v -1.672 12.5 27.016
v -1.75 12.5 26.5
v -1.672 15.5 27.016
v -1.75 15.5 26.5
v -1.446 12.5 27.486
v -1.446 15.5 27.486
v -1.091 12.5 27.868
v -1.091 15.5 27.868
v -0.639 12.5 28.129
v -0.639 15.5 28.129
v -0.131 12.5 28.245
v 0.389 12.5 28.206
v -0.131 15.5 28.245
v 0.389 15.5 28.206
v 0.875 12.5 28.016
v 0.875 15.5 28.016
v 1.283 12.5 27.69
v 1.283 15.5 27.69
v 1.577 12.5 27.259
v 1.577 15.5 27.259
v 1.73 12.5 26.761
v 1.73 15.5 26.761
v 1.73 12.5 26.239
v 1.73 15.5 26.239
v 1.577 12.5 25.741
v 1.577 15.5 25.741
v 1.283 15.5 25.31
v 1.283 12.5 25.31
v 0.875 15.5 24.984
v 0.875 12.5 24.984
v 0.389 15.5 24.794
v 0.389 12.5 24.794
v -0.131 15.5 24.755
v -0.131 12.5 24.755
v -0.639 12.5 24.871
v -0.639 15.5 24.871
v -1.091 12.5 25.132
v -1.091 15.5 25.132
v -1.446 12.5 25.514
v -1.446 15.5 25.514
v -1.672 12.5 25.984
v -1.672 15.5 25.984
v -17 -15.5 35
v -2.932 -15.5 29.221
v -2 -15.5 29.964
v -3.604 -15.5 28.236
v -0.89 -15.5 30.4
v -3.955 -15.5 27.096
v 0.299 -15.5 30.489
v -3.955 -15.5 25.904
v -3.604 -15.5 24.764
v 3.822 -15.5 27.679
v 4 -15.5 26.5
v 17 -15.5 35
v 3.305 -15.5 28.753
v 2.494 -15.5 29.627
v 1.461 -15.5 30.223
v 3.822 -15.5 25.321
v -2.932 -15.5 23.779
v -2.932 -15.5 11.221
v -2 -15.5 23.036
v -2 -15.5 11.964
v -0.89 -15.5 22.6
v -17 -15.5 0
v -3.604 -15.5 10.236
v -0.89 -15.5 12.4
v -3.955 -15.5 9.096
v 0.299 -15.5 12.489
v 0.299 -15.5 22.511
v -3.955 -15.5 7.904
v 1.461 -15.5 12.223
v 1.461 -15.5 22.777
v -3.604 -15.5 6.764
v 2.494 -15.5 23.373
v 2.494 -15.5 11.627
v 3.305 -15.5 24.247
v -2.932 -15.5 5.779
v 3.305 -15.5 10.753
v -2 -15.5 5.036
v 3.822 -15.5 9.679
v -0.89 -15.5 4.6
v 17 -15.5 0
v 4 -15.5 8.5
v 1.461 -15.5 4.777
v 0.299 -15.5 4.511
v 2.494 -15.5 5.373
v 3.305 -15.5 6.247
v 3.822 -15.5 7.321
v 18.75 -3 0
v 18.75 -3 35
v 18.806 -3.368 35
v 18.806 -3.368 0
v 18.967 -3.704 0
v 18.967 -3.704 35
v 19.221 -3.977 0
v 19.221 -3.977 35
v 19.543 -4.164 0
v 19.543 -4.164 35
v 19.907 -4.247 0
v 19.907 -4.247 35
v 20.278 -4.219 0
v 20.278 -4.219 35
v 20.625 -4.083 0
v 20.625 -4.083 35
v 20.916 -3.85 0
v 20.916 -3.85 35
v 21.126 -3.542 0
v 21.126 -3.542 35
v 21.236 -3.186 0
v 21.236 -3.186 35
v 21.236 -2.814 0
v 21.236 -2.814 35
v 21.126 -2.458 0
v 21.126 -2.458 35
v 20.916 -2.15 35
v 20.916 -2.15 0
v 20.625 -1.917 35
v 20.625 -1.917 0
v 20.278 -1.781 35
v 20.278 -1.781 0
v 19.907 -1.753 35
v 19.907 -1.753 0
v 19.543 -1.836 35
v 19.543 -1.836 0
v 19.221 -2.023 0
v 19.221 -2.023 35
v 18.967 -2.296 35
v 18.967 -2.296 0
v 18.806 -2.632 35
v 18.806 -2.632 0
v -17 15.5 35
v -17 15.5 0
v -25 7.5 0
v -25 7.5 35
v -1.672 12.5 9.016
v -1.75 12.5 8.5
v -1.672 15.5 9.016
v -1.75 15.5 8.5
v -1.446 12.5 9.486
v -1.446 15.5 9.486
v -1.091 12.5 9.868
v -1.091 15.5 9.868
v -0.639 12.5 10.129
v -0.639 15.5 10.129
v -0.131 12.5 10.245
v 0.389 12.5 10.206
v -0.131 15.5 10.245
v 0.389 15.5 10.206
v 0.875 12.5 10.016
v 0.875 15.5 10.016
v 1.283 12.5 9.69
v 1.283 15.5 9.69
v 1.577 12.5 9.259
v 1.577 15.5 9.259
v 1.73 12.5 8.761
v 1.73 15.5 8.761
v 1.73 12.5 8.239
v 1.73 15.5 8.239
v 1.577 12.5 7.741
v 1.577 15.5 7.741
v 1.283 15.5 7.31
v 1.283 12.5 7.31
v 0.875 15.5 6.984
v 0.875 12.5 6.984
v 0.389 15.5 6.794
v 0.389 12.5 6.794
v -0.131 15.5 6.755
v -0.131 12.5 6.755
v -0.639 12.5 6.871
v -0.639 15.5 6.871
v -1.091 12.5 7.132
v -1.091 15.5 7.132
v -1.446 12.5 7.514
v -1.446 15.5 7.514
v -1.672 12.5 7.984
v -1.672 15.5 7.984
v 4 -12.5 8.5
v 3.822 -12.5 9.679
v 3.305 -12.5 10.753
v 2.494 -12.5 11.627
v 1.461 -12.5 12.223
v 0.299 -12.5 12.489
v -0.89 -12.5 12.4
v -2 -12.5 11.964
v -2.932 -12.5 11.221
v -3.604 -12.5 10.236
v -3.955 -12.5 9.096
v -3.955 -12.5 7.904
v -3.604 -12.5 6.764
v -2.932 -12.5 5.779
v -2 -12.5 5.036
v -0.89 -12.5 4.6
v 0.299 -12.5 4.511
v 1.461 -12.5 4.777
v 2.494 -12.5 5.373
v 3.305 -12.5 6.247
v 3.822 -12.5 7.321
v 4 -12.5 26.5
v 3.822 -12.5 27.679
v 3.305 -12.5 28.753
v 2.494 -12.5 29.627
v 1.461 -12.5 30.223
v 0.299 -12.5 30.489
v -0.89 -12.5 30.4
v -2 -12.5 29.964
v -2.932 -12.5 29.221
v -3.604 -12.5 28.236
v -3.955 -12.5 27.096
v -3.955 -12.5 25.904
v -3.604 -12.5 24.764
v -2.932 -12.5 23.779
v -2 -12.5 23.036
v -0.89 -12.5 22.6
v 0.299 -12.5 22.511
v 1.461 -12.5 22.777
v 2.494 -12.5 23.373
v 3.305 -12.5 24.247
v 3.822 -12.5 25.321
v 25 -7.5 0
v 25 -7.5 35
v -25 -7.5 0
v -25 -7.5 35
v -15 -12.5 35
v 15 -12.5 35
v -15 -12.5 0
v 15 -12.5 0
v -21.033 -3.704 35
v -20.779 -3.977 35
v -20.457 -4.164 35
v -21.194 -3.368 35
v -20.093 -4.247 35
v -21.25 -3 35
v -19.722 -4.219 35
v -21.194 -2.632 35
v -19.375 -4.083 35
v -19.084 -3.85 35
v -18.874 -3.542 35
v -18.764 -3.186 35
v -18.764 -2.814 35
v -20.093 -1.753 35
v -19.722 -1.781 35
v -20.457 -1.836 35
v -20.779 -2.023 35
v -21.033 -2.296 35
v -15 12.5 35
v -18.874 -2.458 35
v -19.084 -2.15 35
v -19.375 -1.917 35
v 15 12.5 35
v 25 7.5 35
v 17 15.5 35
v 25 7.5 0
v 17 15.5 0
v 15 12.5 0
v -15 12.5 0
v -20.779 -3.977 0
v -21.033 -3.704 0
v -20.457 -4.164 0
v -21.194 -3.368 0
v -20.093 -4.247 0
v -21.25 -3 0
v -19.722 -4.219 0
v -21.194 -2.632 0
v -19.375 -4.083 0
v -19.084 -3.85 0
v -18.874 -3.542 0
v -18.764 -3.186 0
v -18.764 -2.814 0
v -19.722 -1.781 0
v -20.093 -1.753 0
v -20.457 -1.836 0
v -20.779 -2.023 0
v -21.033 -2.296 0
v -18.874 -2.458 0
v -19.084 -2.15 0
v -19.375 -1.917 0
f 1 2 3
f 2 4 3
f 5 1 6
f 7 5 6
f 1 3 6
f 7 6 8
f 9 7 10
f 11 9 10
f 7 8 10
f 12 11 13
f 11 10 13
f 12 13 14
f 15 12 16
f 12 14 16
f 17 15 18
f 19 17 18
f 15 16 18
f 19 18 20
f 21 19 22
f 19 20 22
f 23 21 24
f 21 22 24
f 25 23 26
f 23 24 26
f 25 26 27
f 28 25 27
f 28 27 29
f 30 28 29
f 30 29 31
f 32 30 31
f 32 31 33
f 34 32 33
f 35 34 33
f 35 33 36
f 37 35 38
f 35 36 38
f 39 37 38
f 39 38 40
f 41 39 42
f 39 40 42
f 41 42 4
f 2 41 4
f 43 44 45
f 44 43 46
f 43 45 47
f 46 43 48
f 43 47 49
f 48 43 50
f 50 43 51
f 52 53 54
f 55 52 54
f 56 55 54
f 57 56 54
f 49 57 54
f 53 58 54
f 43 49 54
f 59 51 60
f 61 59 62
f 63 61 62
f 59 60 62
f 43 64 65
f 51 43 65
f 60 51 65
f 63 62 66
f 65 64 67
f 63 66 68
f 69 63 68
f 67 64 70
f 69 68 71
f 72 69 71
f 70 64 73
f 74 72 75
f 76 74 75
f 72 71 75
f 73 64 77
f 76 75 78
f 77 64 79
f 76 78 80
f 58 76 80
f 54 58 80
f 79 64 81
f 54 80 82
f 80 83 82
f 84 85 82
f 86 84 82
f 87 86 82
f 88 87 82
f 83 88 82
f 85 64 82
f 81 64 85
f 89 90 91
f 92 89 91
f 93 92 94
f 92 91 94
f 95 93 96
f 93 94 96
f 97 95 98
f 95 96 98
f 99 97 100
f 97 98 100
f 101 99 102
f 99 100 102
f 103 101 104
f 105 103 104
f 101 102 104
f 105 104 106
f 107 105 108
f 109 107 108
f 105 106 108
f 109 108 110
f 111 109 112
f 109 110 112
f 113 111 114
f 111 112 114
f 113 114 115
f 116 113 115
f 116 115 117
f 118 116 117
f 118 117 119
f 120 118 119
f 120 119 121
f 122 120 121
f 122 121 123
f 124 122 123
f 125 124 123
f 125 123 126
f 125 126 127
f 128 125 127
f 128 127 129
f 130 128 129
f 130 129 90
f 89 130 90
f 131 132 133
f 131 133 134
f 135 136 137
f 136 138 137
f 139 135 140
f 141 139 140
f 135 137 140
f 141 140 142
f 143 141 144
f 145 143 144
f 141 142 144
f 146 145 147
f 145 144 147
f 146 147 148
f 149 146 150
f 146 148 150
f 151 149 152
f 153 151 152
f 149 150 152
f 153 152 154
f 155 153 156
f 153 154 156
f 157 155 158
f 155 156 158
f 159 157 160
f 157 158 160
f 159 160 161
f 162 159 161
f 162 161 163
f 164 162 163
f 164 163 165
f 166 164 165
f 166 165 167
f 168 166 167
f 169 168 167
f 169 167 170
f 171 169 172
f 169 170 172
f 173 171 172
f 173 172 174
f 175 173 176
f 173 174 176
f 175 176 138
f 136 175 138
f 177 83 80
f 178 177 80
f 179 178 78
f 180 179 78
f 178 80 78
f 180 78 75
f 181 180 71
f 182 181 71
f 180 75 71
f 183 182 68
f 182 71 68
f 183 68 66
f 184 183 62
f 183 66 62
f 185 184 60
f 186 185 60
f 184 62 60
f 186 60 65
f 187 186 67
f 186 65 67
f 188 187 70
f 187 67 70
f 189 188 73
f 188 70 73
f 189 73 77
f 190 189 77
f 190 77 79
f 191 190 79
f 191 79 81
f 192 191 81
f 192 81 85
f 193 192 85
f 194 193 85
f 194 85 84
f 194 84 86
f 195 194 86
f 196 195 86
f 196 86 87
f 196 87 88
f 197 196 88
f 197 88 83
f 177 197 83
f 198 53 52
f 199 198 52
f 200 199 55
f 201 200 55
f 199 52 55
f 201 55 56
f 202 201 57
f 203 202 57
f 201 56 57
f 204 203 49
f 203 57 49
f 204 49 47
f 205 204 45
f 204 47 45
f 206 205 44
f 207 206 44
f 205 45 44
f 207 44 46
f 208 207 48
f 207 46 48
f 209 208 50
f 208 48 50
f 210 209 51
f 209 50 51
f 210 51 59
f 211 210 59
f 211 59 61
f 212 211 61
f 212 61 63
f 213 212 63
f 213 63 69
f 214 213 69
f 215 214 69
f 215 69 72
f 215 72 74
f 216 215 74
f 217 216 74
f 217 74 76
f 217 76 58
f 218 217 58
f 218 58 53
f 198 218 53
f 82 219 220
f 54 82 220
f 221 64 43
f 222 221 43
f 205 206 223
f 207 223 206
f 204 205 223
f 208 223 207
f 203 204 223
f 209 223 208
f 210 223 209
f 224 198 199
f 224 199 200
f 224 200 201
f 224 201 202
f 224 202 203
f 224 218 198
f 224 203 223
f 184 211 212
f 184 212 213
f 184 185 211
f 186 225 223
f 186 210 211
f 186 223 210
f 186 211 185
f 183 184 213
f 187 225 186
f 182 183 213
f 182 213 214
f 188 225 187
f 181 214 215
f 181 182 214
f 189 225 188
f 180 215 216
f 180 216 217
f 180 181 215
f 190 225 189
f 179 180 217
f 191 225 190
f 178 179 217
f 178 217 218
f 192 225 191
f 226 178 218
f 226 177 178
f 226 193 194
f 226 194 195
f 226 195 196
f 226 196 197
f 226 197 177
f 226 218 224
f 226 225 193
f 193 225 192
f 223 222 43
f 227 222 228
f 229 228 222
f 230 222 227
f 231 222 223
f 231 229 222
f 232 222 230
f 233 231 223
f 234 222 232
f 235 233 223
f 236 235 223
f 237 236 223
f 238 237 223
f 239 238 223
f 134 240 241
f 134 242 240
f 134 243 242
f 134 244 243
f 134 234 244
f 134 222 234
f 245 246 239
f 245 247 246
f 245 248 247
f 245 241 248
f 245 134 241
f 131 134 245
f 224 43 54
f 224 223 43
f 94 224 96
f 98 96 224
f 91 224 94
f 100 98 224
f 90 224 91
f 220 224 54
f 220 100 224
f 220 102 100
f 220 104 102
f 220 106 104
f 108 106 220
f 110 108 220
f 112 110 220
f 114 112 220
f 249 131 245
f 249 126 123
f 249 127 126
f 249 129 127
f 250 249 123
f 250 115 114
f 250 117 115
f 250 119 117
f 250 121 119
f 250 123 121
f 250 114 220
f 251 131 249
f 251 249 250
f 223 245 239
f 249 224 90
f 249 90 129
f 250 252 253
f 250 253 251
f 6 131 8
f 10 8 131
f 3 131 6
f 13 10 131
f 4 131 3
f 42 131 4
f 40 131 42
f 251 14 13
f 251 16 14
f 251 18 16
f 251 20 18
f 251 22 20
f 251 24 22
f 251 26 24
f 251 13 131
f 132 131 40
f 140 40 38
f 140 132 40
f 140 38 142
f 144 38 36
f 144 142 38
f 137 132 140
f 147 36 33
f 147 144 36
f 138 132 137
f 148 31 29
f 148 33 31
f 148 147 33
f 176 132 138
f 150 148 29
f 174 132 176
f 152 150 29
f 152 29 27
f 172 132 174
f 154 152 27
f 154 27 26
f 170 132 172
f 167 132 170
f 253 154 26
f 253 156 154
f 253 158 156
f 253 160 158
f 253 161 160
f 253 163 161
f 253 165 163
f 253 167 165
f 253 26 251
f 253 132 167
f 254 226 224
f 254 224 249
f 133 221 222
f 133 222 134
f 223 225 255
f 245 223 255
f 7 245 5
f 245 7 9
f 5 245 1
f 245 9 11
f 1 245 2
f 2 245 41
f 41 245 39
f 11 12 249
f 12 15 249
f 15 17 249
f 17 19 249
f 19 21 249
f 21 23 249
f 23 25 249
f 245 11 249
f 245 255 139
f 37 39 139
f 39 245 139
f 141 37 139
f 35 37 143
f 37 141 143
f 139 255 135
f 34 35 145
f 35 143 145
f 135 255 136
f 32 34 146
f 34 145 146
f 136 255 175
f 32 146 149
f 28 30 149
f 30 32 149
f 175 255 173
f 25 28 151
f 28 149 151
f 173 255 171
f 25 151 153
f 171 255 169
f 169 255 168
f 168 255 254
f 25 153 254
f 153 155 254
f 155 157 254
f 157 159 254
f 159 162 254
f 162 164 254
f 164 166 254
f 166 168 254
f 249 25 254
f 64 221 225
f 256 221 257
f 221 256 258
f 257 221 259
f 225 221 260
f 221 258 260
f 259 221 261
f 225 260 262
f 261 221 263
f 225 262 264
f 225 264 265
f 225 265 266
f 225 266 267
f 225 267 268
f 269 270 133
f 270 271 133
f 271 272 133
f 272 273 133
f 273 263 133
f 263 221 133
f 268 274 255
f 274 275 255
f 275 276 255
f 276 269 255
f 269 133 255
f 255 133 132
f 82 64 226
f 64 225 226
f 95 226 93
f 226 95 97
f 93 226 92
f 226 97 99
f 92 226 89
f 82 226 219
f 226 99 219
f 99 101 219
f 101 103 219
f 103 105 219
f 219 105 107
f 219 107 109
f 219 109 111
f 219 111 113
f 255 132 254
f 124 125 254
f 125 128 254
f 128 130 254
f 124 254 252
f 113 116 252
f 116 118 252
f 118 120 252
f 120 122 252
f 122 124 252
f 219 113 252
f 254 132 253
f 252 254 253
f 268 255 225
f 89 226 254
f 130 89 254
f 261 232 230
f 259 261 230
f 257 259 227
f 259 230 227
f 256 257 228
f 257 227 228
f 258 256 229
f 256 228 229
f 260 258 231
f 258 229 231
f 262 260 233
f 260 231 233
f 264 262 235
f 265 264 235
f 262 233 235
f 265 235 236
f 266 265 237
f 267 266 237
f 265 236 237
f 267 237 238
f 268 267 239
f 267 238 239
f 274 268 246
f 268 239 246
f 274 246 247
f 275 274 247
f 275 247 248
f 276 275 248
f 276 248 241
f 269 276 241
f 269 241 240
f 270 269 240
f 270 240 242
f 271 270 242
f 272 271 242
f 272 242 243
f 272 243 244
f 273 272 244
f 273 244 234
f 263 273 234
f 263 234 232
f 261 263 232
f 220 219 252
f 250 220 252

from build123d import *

# Parameters (mm, degrees)
F0_W           = 50
F0_H           = 31
F0_W_2         = 30
F0_H_2         = 25
F1_DEPTH       = 35
F3_D           = 3.5
F3_CBORE_D     = 8
F3_CBORE_DEPTH = 5
F5_D           = 2.5
F6_SIZE        = 8


with BuildPart() as f1:
    # F0 (on Top) → F1 (new body)
    with BuildSketch(Plane.XY):
        Rectangle(F0_W, F0_H)
        Rectangle(F0_W_2, F0_H_2, mode=Mode.SUBTRACT)
    extrude(amount=F1_DEPTH)

    # F3 (through all)
    with Locations(Plane.XZ.offset(15.5)):
        with Locations((0, 26.5), (0, 8.5)):
            CounterBoreHole(F3_D / 2, F3_CBORE_D / 2, F3_CBORE_DEPTH)

    # F5 (through all)
    with Locations(Plane(origin=(0, 0, 0), x_dir=(1, 0, 0), z_dir=(0, 0, -1))):
        with Locations((-20, 3), (20, 3)):
            Hole(F5_D / 2)

    # F6
    f6_edges = [f1.edges().sort_by_distance(p)[0] for p in [
        (25, -15.5, 17.5),
        (-25, -15.5, 17.5),
        (-25, 15.5, 17.5),
        (25, 15.5, 17.5),
    ]]
    chamfer(f6_edges, length=F6_SIZE)


solid = f1.part
